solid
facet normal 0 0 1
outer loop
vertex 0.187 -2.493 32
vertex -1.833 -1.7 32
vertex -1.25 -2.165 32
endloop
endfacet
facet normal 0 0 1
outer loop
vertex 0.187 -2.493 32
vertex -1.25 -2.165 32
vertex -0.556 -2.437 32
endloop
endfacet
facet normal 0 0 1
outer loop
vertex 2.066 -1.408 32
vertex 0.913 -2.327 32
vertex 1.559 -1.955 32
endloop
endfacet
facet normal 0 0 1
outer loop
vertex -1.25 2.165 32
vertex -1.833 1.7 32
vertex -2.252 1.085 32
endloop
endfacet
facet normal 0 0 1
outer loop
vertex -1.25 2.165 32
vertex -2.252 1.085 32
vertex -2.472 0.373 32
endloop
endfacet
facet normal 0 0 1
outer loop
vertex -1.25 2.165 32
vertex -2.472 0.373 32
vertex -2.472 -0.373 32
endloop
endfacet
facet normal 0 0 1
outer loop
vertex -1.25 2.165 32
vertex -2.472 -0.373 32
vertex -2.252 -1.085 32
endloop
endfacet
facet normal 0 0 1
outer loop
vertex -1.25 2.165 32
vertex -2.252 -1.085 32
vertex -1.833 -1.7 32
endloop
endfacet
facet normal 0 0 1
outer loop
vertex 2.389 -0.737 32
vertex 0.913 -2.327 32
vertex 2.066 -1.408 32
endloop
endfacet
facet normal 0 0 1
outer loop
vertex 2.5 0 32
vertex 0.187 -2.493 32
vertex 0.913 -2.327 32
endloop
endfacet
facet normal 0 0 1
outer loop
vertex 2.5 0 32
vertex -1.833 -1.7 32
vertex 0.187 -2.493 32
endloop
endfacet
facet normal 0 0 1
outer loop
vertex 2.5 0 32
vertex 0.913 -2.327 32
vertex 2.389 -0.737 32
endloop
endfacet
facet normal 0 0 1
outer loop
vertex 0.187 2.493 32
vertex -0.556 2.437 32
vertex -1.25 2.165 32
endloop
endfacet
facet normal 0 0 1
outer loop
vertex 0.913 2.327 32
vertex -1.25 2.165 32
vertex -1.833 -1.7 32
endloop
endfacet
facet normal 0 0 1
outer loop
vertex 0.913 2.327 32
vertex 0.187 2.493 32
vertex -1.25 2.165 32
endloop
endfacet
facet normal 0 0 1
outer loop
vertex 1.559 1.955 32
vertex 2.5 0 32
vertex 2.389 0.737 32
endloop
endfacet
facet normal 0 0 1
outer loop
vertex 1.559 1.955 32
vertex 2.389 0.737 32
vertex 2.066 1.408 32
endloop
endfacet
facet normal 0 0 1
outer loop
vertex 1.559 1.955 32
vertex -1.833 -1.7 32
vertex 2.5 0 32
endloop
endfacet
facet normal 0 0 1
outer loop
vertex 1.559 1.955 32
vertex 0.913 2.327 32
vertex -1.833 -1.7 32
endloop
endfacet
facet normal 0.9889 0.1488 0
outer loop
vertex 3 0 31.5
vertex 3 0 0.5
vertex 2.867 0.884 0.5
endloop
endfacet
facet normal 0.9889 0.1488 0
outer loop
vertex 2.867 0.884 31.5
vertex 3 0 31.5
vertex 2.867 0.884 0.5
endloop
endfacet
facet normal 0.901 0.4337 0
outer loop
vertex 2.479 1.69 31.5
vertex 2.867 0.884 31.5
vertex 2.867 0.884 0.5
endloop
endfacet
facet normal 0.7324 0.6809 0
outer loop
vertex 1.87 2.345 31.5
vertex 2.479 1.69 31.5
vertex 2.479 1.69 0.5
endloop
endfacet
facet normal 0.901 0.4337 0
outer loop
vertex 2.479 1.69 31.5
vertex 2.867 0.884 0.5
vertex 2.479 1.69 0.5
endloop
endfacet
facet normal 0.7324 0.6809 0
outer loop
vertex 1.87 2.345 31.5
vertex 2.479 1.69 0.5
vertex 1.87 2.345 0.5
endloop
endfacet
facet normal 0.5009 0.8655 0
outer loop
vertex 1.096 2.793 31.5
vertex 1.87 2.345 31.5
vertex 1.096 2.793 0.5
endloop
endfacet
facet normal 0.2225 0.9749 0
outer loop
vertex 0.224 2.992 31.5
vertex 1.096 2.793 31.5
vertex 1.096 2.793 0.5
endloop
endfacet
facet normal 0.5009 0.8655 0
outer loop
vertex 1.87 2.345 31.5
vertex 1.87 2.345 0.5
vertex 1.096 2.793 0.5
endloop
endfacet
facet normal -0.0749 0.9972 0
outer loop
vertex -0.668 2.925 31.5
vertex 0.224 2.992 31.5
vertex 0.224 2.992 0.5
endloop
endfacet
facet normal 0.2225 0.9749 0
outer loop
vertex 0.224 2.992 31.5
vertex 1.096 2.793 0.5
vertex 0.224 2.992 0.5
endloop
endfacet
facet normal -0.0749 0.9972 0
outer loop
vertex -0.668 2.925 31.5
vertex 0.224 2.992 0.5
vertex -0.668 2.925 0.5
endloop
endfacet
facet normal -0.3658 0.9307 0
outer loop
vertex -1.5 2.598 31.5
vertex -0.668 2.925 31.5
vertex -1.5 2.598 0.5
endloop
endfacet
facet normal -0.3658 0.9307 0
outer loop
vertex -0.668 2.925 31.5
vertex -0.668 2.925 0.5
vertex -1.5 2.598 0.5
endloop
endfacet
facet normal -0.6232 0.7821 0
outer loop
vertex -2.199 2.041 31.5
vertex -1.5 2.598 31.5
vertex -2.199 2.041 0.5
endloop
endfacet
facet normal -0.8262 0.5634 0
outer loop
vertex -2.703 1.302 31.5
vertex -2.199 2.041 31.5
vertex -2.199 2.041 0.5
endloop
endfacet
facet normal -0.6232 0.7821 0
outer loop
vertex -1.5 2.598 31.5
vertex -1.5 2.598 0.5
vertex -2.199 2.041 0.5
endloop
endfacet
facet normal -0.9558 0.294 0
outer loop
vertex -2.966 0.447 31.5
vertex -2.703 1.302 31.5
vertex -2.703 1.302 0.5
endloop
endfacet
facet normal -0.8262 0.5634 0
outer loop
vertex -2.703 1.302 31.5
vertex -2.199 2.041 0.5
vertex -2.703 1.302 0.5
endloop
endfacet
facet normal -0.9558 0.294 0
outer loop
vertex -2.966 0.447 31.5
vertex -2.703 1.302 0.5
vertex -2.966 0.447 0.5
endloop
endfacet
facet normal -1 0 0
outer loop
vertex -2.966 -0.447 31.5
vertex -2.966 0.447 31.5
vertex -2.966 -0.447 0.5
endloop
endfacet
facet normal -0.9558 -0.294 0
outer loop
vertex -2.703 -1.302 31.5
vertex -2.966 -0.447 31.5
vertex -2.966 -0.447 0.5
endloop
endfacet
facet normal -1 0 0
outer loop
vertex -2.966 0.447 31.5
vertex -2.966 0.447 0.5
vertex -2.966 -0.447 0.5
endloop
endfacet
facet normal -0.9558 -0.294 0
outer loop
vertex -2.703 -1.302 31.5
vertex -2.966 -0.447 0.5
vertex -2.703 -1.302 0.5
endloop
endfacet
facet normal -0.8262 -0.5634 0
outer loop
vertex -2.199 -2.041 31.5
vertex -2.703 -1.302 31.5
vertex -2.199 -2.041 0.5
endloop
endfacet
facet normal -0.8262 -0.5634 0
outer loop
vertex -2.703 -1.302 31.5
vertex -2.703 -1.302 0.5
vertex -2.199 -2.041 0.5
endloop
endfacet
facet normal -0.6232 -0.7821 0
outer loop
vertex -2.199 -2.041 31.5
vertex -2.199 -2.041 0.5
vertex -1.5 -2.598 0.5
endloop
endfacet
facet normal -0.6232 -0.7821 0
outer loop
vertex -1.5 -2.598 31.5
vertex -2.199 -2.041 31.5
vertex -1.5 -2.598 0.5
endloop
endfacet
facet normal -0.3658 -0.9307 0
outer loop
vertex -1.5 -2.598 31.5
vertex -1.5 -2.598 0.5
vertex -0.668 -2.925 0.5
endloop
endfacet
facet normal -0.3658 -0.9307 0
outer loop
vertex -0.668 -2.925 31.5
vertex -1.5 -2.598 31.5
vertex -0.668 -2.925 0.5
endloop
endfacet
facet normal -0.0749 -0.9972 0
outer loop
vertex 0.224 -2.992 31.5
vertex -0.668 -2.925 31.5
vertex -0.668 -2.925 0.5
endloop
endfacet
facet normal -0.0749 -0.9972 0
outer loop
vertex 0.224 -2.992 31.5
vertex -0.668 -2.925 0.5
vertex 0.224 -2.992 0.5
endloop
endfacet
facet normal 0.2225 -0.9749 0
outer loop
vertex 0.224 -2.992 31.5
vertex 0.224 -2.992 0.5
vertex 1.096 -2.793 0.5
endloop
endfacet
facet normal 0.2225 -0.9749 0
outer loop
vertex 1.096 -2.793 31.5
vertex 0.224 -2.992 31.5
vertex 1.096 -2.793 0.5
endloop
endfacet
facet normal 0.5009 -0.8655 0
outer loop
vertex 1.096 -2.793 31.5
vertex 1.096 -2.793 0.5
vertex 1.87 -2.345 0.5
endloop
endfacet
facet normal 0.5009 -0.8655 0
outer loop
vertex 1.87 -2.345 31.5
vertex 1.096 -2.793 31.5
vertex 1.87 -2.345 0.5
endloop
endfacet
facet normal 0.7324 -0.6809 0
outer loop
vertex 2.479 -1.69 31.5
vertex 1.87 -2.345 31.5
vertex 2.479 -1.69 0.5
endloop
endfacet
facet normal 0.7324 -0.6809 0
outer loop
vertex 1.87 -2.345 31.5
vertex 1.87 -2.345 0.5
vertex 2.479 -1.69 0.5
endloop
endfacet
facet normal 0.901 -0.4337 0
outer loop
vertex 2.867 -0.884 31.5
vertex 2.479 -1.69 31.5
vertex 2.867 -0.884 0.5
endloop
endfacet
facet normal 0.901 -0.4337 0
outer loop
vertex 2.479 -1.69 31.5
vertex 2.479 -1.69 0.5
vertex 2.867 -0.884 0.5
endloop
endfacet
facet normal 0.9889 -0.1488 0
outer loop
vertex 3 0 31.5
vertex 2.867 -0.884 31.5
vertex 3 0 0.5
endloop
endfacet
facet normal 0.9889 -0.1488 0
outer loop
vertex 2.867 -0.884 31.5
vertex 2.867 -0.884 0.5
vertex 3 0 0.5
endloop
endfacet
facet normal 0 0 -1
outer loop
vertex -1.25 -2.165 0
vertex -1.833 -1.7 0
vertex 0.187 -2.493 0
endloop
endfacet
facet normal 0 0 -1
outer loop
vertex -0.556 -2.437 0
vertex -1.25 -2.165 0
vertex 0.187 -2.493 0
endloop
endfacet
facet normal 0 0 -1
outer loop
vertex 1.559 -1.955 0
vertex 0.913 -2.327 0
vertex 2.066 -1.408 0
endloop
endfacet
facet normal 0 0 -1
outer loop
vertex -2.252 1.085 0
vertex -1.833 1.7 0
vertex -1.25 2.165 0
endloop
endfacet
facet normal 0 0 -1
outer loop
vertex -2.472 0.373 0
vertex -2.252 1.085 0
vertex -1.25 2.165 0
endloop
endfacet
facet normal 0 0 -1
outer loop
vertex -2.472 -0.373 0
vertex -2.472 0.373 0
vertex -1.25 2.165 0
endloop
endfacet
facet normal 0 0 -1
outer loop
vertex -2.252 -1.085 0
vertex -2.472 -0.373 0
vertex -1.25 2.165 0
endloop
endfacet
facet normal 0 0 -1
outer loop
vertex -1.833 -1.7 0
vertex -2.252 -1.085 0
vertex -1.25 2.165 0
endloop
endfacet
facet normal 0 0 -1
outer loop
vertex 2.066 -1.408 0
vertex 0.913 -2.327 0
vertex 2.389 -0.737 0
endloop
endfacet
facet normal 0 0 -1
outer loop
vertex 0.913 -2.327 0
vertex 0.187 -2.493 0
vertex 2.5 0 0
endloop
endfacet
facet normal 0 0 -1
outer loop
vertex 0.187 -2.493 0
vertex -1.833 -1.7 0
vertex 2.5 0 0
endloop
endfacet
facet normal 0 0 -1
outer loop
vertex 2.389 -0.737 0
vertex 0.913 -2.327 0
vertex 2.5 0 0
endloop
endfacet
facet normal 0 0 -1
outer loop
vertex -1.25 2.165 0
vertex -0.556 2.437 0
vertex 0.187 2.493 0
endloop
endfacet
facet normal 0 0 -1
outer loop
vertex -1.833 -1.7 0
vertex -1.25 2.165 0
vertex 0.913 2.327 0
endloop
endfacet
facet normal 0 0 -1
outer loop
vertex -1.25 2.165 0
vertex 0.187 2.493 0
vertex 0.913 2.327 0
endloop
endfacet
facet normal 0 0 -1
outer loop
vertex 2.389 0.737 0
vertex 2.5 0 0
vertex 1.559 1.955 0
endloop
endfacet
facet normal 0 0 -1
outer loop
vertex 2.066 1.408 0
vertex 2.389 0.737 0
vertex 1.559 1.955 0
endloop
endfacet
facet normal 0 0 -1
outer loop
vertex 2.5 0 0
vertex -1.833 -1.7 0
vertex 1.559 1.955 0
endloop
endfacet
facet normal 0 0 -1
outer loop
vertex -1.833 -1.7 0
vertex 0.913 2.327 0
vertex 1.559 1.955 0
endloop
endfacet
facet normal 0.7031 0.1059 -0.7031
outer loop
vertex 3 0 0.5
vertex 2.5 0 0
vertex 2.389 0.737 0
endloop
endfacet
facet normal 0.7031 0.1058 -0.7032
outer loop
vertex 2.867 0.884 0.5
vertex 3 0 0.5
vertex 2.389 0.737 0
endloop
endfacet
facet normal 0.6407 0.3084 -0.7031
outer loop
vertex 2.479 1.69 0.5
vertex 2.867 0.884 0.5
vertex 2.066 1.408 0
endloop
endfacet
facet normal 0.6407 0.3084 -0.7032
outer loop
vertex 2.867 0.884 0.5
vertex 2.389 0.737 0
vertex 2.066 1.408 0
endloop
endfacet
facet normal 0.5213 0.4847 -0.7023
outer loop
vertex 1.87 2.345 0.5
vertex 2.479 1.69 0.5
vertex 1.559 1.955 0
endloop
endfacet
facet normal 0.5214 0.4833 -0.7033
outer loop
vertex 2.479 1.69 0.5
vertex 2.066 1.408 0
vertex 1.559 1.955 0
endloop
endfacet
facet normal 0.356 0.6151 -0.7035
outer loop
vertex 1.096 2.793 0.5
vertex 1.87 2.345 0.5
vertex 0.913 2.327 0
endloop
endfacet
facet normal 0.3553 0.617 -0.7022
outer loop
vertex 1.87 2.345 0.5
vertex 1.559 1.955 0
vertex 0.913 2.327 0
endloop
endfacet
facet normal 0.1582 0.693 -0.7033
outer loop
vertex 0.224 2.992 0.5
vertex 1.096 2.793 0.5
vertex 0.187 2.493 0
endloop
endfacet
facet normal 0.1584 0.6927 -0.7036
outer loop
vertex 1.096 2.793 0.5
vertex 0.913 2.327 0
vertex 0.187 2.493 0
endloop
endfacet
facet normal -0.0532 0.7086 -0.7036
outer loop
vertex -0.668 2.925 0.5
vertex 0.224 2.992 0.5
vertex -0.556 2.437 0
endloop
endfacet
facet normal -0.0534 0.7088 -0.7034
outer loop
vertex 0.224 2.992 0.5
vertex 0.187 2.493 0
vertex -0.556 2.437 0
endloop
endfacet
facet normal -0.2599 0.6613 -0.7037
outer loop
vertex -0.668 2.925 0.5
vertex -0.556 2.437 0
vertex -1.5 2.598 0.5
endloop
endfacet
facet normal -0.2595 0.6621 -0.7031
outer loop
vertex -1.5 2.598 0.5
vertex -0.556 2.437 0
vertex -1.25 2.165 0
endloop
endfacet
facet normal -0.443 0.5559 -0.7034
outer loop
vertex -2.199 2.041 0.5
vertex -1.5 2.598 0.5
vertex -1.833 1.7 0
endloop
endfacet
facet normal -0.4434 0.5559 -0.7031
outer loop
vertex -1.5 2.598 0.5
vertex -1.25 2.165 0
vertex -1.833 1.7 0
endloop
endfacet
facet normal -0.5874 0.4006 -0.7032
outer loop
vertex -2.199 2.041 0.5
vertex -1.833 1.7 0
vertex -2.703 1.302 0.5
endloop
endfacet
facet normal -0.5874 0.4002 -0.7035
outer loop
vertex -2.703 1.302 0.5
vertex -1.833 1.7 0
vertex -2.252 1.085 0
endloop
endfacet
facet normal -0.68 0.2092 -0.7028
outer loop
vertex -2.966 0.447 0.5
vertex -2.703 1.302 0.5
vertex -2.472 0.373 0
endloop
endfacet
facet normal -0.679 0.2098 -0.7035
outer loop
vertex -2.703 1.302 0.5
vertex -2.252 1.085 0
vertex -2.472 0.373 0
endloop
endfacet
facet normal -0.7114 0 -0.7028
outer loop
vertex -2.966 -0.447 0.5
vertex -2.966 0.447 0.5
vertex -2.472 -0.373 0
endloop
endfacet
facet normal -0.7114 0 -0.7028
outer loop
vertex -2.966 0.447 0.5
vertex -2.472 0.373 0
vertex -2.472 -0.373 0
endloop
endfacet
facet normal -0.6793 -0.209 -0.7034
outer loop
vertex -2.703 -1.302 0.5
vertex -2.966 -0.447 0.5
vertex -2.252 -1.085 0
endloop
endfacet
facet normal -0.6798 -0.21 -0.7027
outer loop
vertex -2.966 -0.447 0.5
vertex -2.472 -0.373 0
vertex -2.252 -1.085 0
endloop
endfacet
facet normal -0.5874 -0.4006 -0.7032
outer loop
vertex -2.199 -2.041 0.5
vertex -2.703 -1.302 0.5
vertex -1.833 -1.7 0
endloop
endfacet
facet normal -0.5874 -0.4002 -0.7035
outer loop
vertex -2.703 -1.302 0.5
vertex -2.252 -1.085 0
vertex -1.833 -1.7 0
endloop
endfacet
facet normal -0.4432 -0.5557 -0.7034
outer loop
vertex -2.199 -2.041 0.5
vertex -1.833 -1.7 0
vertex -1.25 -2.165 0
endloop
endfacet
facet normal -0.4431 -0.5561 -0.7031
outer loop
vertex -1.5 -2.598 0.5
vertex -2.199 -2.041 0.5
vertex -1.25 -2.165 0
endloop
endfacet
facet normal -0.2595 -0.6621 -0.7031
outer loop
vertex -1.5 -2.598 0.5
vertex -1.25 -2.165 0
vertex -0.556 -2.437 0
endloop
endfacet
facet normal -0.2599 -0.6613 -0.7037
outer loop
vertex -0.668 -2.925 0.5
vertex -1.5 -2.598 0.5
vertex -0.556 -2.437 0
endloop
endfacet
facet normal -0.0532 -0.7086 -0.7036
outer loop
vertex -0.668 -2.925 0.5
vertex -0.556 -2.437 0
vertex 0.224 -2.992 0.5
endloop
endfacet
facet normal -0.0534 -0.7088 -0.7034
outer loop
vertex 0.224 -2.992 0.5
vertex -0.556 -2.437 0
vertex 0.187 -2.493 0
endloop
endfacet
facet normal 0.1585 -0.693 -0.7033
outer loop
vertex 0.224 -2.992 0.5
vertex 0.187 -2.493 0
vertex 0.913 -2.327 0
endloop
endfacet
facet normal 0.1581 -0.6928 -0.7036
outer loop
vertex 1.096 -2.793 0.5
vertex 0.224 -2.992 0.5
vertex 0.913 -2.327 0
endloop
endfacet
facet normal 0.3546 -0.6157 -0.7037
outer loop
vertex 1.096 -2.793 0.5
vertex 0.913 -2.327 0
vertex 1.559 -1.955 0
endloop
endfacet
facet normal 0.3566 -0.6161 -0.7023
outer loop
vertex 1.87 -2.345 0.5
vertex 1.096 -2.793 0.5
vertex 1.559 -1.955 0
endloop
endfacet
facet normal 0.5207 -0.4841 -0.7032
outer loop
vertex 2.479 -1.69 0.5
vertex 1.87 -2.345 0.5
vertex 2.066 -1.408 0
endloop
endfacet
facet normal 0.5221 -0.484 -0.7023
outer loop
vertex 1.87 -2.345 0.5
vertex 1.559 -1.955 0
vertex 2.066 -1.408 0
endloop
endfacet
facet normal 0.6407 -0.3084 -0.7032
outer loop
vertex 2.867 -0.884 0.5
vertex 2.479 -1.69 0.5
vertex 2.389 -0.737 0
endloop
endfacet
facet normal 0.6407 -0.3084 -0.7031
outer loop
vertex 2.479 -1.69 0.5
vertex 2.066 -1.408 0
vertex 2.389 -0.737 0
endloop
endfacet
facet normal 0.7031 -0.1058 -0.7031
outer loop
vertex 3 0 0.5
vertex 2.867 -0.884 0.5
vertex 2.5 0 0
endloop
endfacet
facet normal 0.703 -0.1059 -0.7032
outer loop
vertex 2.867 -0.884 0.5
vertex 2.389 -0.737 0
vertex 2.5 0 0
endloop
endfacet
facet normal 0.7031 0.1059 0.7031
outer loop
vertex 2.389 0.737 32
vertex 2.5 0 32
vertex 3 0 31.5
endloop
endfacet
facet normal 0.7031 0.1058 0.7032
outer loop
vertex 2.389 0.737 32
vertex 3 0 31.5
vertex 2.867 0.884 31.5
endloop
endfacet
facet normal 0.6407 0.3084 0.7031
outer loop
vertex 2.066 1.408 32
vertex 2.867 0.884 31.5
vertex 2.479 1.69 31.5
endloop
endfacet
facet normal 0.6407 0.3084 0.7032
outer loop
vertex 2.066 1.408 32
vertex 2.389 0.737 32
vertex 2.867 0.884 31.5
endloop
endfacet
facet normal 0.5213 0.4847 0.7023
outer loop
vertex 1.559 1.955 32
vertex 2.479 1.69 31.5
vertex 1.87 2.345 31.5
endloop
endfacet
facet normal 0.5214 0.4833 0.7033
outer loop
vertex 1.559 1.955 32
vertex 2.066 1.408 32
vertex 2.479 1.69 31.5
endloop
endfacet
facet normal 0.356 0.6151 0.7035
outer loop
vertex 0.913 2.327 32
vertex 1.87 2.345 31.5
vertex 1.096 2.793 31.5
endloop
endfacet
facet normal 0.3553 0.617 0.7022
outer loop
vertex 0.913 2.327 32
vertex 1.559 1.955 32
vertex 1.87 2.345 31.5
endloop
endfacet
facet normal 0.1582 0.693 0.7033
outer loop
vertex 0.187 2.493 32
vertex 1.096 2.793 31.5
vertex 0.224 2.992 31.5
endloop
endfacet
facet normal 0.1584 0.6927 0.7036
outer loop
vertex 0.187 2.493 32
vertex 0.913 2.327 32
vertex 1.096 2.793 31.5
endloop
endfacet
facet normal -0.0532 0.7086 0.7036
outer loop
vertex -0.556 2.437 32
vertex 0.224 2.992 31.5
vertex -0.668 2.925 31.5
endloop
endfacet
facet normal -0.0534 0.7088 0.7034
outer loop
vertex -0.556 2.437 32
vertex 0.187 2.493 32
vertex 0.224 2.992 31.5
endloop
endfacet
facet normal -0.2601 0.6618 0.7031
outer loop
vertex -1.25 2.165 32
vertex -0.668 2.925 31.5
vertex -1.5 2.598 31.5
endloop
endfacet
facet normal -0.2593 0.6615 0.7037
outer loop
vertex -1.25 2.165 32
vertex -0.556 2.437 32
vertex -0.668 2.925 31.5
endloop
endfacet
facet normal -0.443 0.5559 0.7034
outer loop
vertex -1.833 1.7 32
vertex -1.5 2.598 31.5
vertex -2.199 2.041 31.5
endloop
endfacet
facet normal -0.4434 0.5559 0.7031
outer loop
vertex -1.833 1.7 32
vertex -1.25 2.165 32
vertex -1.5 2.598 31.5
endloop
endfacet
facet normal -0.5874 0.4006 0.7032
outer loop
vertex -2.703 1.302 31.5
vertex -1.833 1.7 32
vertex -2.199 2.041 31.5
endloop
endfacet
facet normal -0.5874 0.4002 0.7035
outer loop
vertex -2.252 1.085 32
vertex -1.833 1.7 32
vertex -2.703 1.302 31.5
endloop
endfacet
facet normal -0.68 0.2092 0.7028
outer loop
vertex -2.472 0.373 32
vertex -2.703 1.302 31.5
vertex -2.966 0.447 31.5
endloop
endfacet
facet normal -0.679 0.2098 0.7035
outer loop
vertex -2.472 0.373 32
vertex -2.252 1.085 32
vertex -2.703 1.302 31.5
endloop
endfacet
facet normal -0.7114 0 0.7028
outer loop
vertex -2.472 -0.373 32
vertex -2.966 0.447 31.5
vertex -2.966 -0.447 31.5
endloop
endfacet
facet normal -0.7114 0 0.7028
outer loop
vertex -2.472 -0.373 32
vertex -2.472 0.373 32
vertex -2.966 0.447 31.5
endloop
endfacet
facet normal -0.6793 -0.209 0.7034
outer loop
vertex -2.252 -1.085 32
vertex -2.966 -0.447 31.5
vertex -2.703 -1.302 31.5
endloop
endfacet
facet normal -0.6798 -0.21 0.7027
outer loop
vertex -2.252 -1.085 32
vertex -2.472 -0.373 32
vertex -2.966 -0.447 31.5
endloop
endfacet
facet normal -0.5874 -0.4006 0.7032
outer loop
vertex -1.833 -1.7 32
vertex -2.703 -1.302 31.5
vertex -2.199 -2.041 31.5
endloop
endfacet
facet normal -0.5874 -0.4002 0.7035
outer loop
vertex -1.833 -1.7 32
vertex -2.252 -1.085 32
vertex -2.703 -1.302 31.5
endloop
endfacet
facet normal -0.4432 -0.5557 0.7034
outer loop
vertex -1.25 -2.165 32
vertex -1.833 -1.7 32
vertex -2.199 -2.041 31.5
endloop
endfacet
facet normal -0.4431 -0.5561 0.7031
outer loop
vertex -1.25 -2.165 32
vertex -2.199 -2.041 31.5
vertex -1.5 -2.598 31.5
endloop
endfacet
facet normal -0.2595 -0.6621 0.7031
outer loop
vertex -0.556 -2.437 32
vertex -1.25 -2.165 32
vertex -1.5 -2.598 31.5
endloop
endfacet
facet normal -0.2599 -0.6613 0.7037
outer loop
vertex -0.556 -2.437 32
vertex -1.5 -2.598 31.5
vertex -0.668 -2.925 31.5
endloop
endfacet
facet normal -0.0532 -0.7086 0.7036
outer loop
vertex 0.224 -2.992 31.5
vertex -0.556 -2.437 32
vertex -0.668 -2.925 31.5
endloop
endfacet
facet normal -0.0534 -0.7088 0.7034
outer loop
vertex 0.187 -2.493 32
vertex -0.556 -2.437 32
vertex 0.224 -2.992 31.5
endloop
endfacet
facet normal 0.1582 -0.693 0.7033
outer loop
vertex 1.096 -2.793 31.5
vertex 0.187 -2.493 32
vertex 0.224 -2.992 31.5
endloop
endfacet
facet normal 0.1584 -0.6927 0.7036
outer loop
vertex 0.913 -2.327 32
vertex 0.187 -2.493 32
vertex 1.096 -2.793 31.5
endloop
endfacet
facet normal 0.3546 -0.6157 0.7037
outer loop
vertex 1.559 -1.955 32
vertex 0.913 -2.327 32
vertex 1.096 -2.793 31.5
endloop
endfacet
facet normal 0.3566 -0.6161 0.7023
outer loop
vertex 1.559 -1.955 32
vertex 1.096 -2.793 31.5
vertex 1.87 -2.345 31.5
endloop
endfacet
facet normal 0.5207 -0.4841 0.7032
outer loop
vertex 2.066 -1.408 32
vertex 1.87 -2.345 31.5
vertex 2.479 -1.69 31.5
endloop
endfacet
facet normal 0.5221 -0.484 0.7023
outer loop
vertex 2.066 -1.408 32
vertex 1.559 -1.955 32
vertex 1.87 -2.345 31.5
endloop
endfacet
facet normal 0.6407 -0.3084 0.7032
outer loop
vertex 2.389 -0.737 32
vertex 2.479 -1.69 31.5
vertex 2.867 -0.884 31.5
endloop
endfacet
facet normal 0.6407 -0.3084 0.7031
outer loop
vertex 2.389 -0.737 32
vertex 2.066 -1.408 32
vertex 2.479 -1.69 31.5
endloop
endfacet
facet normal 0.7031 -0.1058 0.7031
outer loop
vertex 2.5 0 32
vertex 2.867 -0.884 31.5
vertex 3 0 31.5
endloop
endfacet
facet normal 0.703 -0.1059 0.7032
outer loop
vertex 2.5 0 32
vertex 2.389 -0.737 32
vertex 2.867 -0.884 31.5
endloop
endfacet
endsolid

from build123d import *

# Parameters (mm, degrees)
SKETCH_1_R      = 3
EXTRUDE_1_DEPTH = 32
CHAMFER_1_SIZE  = 0.5
CHAMFER_2_SIZE  = 0.5


with BuildPart() as part:
    # 草圖1 → 填料-伸長1 (new body)
    with BuildSketch(Plane.XY):
        Circle(SKETCH_1_R)
    extrude(amount=EXTRUDE_1_DEPTH)

    # 導角1
    chamfer_1_edges = [part.edges().sort_by_distance(p)[0] for p in [
        (-3, 0, 32),
    ]]
    chamfer(chamfer_1_edges, length=CHAMFER_1_SIZE)

    # 導角2
    chamfer_2_edges = [part.edges().sort_by_distance(p)[0] for p in [
        (-3, 0, 0),
    ]]
    chamfer(chamfer_2_edges, length=CHAMFER_2_SIZE)


solid = part.part
